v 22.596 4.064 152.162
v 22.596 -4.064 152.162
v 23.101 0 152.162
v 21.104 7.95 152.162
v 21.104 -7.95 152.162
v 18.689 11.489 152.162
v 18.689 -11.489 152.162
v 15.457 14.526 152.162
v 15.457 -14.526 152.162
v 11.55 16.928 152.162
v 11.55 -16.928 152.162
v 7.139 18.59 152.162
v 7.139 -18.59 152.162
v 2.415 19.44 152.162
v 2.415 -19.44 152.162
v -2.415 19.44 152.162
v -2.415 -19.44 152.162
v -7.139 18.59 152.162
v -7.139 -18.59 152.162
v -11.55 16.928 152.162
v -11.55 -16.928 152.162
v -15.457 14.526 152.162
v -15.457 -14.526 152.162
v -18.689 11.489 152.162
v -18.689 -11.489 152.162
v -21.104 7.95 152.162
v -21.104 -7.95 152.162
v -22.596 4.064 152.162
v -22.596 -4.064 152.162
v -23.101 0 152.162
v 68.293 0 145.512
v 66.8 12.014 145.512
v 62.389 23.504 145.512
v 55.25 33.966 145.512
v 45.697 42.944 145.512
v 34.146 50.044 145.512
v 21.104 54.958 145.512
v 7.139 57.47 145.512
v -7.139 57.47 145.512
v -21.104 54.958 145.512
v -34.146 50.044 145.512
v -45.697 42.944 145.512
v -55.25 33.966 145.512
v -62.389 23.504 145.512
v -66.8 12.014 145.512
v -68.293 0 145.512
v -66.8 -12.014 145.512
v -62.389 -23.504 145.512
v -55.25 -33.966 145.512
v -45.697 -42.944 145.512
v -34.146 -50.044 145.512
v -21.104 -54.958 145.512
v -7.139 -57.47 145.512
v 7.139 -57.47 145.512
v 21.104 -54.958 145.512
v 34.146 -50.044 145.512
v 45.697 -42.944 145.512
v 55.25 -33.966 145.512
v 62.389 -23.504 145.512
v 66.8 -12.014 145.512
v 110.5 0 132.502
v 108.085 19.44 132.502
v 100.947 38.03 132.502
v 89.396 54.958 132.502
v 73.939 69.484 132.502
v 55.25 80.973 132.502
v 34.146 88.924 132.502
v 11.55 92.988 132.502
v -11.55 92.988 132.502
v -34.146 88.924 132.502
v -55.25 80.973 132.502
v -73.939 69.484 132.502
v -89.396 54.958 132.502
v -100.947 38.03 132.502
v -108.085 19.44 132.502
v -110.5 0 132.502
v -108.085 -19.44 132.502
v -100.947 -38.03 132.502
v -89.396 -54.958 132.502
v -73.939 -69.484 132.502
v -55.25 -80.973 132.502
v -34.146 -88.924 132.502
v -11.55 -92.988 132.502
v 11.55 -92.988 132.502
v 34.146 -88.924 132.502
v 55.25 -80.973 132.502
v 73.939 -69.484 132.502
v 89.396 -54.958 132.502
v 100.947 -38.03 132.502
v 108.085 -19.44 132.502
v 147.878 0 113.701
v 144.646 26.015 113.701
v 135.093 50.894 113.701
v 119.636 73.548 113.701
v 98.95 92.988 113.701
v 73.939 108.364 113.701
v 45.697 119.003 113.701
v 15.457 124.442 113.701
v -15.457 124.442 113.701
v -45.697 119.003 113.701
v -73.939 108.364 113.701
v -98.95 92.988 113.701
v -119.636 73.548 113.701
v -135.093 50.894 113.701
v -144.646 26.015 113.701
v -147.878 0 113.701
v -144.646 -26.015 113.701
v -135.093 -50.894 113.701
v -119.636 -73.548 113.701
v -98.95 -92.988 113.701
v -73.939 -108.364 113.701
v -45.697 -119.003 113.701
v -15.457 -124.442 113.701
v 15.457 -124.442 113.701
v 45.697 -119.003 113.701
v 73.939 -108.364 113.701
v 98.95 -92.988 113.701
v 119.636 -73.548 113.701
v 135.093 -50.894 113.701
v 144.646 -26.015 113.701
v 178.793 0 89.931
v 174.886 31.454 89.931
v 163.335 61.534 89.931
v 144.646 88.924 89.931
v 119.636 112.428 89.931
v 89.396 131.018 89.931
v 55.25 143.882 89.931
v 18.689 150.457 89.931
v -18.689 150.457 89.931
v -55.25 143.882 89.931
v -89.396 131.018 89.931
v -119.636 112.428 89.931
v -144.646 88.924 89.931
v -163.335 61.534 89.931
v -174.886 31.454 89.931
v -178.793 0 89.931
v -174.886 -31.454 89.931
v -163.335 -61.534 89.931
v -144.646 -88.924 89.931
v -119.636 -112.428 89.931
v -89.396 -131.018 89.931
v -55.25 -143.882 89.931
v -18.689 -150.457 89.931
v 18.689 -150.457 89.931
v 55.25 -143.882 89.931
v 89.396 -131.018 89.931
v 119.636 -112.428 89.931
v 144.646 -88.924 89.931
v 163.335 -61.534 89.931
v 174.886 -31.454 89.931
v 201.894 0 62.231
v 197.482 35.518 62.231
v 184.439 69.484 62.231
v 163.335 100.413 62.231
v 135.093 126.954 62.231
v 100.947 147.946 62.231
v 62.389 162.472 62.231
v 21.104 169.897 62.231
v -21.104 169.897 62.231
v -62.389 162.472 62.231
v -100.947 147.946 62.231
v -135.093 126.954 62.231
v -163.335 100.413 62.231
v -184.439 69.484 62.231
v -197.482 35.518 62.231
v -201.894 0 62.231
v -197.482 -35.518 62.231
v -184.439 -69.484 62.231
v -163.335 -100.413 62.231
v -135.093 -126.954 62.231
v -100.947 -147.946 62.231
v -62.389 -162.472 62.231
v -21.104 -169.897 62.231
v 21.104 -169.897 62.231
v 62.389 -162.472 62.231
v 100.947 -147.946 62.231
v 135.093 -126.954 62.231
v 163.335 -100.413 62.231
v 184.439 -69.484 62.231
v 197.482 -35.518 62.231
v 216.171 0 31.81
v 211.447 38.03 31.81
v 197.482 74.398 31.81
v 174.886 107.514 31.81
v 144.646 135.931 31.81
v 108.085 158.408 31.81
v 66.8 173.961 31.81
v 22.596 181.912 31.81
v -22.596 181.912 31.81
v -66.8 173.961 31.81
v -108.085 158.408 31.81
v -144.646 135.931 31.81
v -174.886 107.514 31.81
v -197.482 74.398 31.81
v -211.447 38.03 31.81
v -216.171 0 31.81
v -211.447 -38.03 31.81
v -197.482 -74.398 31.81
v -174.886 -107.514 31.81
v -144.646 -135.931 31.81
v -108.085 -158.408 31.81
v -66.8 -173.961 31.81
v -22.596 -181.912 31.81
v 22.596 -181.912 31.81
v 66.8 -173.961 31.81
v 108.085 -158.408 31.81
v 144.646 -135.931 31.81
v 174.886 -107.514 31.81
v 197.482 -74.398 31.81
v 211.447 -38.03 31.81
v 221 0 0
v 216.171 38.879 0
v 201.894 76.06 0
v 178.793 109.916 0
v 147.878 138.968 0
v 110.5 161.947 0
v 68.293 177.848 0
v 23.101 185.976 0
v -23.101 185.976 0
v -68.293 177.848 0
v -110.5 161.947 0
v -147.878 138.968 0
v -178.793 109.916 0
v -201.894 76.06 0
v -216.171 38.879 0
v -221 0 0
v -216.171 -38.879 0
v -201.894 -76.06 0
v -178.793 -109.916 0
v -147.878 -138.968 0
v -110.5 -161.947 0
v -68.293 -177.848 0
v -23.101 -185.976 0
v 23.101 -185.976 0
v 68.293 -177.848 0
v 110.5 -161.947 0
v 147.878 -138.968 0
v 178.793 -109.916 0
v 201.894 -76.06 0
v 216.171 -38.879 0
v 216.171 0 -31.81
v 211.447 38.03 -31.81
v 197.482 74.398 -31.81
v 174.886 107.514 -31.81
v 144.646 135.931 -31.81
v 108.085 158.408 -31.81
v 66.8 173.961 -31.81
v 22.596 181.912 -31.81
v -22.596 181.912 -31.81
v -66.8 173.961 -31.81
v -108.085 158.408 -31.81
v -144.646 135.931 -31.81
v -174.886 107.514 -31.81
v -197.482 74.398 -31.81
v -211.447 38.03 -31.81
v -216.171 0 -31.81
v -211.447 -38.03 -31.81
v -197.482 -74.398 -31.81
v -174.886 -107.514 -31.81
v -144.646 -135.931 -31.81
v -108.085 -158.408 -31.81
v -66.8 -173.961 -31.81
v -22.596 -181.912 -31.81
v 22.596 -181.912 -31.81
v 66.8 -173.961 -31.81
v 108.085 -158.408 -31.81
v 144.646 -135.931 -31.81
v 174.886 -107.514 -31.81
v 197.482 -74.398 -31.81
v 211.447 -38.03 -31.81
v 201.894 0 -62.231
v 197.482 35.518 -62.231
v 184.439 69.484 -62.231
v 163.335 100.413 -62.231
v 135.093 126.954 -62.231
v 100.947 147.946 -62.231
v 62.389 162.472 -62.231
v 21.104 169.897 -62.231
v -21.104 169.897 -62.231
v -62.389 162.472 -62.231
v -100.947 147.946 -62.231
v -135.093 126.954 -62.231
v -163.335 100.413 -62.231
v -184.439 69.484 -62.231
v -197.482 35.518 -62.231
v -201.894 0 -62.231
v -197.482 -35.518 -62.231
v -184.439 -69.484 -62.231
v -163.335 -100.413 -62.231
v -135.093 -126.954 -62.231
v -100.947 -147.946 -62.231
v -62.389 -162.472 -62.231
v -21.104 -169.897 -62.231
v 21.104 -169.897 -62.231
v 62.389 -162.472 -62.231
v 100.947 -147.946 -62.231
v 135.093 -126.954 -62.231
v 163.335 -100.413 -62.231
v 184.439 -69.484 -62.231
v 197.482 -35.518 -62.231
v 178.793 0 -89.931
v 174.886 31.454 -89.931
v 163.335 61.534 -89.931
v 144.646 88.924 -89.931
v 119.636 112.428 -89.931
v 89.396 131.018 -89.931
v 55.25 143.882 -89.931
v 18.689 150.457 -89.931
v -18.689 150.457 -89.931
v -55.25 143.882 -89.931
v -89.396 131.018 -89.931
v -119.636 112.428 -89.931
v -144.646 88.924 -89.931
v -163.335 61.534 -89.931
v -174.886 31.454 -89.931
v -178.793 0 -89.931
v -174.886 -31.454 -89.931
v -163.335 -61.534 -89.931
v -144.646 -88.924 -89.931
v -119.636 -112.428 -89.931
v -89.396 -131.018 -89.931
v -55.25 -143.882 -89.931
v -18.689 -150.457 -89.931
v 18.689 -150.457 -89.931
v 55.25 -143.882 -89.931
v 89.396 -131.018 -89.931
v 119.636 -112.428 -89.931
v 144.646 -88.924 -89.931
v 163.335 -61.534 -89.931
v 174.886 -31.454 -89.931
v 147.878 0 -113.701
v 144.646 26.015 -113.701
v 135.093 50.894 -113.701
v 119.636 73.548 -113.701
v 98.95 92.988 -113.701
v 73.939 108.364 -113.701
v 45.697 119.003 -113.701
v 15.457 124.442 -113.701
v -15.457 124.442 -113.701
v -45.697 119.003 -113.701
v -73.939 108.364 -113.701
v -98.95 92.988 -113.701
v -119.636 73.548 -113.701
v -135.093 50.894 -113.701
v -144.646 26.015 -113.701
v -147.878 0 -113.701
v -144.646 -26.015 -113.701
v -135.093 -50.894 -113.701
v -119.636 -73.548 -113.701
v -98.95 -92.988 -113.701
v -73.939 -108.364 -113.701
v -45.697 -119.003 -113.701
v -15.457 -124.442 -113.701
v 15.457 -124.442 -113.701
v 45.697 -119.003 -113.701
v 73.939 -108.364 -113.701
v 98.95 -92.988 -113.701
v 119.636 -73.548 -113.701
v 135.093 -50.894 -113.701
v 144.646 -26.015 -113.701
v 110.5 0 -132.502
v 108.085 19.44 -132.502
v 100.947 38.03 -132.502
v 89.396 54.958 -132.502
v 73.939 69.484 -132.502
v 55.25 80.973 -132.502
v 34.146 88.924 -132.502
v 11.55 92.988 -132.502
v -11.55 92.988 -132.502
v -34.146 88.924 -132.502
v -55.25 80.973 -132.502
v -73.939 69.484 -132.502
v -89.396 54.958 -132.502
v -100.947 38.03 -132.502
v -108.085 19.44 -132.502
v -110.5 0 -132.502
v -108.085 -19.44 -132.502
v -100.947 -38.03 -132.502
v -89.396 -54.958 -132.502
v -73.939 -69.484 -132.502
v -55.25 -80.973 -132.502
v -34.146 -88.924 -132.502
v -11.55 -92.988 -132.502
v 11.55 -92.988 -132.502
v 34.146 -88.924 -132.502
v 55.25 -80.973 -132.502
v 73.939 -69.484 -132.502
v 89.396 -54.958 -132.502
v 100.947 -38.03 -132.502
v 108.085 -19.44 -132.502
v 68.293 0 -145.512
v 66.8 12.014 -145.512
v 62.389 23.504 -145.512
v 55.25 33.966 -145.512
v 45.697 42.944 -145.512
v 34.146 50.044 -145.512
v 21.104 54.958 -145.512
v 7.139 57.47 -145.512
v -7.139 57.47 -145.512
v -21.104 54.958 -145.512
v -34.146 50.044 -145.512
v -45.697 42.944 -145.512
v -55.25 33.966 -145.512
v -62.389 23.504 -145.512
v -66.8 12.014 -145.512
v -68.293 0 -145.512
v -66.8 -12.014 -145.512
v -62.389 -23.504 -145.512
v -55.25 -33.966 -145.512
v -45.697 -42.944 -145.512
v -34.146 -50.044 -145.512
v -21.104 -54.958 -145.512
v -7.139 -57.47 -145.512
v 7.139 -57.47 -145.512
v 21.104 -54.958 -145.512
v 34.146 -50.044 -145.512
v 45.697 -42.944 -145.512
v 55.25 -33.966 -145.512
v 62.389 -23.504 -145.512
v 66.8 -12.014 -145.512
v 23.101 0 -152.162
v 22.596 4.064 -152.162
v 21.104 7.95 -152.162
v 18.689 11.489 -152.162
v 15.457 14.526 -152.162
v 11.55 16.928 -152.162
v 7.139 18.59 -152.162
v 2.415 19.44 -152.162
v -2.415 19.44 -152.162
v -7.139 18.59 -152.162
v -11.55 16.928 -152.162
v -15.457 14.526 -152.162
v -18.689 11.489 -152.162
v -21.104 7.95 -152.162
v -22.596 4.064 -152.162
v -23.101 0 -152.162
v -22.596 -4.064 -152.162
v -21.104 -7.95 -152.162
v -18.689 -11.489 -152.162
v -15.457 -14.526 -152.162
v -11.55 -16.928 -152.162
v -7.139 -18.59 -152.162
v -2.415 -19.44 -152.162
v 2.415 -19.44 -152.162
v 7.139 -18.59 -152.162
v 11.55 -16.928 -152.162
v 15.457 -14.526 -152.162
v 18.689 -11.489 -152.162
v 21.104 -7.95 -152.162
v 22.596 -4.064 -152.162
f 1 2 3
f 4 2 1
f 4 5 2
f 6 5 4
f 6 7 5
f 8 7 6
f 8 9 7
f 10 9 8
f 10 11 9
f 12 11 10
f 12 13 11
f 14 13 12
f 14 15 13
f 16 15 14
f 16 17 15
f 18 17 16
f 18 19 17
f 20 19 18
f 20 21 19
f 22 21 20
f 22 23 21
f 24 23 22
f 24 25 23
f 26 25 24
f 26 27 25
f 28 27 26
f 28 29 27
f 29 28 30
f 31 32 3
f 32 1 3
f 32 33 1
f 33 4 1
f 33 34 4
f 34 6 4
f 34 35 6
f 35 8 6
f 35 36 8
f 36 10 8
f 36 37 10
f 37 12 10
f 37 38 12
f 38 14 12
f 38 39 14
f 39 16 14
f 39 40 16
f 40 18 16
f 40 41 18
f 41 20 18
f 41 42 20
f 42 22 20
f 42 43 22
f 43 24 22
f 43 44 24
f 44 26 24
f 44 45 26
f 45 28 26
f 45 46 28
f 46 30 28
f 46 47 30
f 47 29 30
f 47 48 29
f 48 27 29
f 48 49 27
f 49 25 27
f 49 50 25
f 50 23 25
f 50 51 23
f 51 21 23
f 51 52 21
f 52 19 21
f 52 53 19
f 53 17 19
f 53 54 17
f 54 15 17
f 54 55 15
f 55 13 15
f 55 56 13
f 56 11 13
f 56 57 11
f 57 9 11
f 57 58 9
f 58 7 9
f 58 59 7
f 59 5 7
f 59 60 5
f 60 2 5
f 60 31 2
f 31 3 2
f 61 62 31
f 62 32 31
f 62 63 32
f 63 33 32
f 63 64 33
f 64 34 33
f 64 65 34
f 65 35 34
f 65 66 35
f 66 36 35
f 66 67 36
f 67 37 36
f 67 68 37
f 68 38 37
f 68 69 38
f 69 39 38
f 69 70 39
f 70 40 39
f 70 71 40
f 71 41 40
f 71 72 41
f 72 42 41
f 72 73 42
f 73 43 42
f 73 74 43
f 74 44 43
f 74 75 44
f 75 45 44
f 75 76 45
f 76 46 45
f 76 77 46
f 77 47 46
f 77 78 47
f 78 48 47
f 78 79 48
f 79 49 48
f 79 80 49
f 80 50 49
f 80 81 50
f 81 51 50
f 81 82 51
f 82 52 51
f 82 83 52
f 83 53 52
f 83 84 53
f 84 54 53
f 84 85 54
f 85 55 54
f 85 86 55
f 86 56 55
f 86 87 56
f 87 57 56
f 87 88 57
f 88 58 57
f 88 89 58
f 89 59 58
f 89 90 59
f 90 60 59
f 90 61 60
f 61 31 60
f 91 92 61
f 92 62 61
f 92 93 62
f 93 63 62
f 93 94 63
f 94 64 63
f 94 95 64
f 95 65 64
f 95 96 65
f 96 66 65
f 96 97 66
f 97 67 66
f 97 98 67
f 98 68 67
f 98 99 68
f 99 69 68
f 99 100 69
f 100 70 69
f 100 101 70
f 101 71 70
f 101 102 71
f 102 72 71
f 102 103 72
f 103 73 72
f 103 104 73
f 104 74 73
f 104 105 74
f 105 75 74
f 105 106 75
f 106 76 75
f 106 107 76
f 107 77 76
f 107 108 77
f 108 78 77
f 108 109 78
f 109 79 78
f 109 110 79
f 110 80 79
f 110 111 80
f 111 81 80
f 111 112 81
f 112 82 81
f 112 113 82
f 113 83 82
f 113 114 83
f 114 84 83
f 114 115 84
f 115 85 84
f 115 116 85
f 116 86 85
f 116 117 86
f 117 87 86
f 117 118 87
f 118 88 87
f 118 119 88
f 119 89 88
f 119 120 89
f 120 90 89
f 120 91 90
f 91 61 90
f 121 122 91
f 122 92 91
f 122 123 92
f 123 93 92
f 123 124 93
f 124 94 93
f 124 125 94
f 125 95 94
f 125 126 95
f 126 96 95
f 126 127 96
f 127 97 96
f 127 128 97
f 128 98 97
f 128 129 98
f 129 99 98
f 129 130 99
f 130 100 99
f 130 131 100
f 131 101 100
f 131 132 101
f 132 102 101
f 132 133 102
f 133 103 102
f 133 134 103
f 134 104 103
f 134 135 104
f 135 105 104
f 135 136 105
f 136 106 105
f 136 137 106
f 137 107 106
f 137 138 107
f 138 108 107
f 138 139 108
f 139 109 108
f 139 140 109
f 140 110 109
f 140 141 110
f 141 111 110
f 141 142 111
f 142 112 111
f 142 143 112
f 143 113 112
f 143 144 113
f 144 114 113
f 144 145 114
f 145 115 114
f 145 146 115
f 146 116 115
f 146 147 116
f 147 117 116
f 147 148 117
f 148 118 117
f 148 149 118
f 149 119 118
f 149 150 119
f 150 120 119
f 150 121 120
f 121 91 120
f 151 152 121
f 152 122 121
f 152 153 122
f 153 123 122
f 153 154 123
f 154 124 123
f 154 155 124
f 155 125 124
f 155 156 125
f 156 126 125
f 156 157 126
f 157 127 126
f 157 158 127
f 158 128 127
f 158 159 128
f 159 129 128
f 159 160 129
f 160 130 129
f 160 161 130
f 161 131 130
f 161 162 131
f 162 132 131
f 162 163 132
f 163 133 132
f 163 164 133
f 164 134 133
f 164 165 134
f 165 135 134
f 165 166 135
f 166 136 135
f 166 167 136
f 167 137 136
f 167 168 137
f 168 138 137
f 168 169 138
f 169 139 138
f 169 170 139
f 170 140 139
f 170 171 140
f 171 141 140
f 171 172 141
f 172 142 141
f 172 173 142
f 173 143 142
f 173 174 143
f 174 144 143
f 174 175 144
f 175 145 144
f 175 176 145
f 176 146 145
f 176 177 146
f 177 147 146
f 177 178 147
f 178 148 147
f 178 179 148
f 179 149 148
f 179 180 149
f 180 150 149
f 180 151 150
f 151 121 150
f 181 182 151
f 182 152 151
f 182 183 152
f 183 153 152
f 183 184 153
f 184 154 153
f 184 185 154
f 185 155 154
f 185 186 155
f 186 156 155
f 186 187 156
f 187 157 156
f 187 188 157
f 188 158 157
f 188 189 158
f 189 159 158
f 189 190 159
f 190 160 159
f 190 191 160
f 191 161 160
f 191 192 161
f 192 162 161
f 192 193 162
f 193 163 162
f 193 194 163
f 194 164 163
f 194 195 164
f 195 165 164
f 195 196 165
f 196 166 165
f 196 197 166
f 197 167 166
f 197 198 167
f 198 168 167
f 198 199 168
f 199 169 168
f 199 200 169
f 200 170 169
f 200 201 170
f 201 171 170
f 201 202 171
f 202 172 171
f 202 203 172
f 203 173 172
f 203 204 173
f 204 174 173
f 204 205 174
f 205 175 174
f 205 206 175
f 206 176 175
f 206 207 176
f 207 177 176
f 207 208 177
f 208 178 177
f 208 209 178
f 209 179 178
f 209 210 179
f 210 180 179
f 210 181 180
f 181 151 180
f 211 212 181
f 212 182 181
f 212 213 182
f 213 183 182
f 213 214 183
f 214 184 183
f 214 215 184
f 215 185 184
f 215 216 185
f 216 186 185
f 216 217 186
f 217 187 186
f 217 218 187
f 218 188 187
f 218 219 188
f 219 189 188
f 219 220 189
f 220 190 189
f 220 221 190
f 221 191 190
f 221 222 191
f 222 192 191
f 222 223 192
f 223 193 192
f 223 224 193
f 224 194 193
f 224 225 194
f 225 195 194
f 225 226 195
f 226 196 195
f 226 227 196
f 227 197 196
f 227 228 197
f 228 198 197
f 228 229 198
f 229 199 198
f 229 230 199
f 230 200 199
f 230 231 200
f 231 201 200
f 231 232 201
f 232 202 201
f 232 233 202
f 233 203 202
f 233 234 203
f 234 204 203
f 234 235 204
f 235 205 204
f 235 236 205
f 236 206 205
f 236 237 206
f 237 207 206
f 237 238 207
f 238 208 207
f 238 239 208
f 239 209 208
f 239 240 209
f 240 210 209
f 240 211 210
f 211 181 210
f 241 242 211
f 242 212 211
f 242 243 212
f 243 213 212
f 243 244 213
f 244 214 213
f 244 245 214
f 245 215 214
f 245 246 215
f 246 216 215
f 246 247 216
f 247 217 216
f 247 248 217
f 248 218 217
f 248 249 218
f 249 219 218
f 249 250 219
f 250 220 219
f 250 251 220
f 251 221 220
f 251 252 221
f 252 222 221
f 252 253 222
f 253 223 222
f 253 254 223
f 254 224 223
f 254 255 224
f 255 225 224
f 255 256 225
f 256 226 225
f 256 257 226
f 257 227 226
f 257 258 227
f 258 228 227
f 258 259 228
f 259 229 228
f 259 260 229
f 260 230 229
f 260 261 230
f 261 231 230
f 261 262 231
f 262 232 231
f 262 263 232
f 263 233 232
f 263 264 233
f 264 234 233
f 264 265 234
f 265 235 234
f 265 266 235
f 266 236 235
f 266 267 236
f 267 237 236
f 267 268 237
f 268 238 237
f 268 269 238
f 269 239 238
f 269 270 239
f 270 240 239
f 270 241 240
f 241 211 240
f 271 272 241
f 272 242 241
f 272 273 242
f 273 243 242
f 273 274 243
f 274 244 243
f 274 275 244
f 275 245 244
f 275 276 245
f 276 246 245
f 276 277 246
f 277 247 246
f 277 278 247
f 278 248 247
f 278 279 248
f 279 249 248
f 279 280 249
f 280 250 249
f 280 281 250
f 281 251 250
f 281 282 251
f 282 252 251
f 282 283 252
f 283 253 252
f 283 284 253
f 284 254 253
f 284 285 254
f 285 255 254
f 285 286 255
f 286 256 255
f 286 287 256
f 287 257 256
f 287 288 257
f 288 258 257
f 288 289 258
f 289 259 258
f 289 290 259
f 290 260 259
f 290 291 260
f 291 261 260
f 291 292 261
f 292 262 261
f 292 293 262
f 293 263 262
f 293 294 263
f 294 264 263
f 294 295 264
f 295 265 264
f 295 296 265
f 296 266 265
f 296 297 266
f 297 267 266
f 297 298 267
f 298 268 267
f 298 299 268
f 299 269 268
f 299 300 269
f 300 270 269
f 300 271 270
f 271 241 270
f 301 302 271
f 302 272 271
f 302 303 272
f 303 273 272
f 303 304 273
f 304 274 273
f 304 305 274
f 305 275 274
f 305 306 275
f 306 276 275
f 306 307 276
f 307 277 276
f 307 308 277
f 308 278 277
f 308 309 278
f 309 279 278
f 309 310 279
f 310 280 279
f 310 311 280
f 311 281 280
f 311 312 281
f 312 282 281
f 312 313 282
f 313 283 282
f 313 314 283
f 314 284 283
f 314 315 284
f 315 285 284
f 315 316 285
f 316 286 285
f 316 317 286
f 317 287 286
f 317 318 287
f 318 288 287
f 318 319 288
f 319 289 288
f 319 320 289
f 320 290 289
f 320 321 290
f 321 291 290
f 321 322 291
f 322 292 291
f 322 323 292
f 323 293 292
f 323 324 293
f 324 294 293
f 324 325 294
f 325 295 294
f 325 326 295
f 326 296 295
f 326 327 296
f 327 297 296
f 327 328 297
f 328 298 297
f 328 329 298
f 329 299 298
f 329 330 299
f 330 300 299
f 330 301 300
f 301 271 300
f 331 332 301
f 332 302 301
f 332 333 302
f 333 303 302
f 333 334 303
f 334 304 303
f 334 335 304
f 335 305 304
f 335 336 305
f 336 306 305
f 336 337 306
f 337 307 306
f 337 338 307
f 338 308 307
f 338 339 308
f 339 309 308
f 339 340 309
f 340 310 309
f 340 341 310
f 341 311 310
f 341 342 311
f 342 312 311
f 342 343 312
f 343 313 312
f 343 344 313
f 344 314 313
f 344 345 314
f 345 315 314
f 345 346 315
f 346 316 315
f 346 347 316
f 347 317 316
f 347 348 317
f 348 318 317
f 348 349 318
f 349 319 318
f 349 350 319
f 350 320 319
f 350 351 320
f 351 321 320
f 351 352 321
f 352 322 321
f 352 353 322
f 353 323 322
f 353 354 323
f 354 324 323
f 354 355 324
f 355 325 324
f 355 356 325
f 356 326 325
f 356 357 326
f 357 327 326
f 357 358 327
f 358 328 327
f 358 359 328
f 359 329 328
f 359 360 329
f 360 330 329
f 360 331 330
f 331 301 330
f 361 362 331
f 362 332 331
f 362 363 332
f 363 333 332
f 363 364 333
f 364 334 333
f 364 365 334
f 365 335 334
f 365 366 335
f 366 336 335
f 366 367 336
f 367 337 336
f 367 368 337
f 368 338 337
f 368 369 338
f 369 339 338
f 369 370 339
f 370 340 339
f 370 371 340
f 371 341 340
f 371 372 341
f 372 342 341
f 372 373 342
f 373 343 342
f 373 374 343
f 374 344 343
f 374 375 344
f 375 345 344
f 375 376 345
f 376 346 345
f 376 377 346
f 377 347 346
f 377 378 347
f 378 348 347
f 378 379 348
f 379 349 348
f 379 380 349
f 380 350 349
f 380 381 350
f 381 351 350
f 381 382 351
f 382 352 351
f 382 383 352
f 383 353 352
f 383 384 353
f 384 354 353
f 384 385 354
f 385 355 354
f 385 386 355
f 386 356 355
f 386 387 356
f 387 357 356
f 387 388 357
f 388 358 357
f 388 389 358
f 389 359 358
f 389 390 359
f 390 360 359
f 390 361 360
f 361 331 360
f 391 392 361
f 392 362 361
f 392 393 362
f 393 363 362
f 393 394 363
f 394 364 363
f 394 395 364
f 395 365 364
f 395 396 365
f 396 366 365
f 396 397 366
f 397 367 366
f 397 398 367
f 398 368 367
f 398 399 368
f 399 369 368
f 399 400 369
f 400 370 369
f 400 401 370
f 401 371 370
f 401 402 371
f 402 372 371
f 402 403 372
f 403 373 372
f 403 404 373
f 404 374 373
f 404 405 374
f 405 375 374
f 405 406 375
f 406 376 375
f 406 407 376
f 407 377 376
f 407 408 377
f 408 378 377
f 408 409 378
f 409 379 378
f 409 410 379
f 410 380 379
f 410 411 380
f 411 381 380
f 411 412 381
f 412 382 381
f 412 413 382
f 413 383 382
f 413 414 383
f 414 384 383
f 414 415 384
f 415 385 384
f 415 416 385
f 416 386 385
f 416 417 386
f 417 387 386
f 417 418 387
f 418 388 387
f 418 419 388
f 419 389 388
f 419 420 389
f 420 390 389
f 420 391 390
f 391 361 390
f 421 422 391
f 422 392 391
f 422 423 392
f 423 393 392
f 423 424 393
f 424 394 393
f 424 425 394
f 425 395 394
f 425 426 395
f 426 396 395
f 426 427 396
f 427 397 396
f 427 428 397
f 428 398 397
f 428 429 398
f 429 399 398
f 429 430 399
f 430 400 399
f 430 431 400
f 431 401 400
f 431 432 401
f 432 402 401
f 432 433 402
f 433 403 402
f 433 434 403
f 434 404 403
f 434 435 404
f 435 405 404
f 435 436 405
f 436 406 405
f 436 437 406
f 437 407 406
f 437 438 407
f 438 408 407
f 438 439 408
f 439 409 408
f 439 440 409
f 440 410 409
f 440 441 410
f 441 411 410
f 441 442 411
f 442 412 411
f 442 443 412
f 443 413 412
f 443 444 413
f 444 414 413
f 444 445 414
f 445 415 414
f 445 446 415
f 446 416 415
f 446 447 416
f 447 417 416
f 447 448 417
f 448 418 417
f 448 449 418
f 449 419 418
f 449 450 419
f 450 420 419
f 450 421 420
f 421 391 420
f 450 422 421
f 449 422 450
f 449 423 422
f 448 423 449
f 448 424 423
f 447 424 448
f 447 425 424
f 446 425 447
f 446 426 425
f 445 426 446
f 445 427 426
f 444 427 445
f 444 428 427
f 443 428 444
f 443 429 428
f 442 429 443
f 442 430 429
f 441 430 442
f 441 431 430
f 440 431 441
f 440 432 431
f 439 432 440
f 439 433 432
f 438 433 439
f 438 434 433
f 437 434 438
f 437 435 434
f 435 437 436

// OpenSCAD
// Generated by SolidPython 1.0.1 on 2020-07-29 00:46:51


scale(v = [13, 11, 9]) {
	sphere(r = 17);
}
/***********************************************
*********      SolidPython code:      **********
************************************************
 
# import packages: SolidPython
from solid import *
from solid.utils import *
from itertools import chain, combinations, permutations


class Resize:

    def __init__(self, scad_file):
        self.scad_file = scad_file
        #self.scad_file = import_scad(scad_file)
        # cone/cylinder param:
        self.r1 = 0
        self.r2 = 0
        self.h = 0
        # rectangular prism param:
        self.w = 0
        self.l = 0
        # ellipse param:
        self.r = 0

    # import OpenScad code (file name corresponds to shape)


    # classify shape + parameters
    def assign(self, param1, param2, param3):
        if self.scad_file == 'cone.scad':
            self.r1 = param1
            self.r2 = param2
            self.h = param3
        elif self.scad_file == 'cylinder.scad':
            self.r1 = param1
            self.r2 = param2
            self.h = param3
        elif self.scad_file == 'rectangularPrism.scad':
            self.h = param1
            self.l = param2
            self.w = param3
        else:
            self.r = param1
            self.h = param2

    # resize parameters
    def iterate(self):
        x = range(3, 20, 2)
        i = 1
        if self.scad_file == 'cone.scad':
            tempList = list(permutations(x, 2))
            for temp in tempList:
                param1 = temp[0]
                param2 = temp[1]
                filepath = 'produced_scad_files/' + 'cone' + str(param1) + '_' + str(param2) + '_' + '.scad'
                scad_render_to_file(cylinder(h=param1, r1=param2, r2=0), filepath)

        elif self.scad_file == 'cylinder.scad':
            tempList = list(permutations(x, 3))
            for temp in tempList:
                param1 = temp[0]
                param2 = temp[1]
                filepath = 'produced_scad_files/' + 'cylinder' + str(param1) + '_' + str(param2) + '_' + '.scad'
                scad_render_to_file(cylinder(h=param1, r1=param2, r2=param2), filepath)

        elif self.scad_file == 'rectangularPrism.scad':
            tempList = list(permutations(x, 3))
            for temp in tempList:
                param1 = temp[0]
                param2 = temp[1]
                param3 = temp[2]
                filepath = 'produced_scad_files/' + 'rectangularPrism' + str(param1) + '_' + str(param2) + '_' + str(
                    param3) + '.scad'
                scad_render_to_file(cube(size=(param1, param2, param3)), filepath)

        elif self.scad_file == 'ellipse.scad':
            tempList = list(permutations(x, 4))
            for temp in tempList:
                param1 = temp[0]
                param2 = temp[1]
                param3 = temp[2]
                param4 = temp[3]
                filepath = 'produced_scad_files/' + 'ellipse' + str(param1) + '_' + str(param2) + '_' + str(param3) + '_' + str(param4) + '.scad'
                scad_render_to_file(scale([param1, param2, param3])(sphere(r=param4)), filepath)

    def render_to_scadfile(self):
        scad_render_to_file(scad, 'example.scad') 
 
************************************************/
